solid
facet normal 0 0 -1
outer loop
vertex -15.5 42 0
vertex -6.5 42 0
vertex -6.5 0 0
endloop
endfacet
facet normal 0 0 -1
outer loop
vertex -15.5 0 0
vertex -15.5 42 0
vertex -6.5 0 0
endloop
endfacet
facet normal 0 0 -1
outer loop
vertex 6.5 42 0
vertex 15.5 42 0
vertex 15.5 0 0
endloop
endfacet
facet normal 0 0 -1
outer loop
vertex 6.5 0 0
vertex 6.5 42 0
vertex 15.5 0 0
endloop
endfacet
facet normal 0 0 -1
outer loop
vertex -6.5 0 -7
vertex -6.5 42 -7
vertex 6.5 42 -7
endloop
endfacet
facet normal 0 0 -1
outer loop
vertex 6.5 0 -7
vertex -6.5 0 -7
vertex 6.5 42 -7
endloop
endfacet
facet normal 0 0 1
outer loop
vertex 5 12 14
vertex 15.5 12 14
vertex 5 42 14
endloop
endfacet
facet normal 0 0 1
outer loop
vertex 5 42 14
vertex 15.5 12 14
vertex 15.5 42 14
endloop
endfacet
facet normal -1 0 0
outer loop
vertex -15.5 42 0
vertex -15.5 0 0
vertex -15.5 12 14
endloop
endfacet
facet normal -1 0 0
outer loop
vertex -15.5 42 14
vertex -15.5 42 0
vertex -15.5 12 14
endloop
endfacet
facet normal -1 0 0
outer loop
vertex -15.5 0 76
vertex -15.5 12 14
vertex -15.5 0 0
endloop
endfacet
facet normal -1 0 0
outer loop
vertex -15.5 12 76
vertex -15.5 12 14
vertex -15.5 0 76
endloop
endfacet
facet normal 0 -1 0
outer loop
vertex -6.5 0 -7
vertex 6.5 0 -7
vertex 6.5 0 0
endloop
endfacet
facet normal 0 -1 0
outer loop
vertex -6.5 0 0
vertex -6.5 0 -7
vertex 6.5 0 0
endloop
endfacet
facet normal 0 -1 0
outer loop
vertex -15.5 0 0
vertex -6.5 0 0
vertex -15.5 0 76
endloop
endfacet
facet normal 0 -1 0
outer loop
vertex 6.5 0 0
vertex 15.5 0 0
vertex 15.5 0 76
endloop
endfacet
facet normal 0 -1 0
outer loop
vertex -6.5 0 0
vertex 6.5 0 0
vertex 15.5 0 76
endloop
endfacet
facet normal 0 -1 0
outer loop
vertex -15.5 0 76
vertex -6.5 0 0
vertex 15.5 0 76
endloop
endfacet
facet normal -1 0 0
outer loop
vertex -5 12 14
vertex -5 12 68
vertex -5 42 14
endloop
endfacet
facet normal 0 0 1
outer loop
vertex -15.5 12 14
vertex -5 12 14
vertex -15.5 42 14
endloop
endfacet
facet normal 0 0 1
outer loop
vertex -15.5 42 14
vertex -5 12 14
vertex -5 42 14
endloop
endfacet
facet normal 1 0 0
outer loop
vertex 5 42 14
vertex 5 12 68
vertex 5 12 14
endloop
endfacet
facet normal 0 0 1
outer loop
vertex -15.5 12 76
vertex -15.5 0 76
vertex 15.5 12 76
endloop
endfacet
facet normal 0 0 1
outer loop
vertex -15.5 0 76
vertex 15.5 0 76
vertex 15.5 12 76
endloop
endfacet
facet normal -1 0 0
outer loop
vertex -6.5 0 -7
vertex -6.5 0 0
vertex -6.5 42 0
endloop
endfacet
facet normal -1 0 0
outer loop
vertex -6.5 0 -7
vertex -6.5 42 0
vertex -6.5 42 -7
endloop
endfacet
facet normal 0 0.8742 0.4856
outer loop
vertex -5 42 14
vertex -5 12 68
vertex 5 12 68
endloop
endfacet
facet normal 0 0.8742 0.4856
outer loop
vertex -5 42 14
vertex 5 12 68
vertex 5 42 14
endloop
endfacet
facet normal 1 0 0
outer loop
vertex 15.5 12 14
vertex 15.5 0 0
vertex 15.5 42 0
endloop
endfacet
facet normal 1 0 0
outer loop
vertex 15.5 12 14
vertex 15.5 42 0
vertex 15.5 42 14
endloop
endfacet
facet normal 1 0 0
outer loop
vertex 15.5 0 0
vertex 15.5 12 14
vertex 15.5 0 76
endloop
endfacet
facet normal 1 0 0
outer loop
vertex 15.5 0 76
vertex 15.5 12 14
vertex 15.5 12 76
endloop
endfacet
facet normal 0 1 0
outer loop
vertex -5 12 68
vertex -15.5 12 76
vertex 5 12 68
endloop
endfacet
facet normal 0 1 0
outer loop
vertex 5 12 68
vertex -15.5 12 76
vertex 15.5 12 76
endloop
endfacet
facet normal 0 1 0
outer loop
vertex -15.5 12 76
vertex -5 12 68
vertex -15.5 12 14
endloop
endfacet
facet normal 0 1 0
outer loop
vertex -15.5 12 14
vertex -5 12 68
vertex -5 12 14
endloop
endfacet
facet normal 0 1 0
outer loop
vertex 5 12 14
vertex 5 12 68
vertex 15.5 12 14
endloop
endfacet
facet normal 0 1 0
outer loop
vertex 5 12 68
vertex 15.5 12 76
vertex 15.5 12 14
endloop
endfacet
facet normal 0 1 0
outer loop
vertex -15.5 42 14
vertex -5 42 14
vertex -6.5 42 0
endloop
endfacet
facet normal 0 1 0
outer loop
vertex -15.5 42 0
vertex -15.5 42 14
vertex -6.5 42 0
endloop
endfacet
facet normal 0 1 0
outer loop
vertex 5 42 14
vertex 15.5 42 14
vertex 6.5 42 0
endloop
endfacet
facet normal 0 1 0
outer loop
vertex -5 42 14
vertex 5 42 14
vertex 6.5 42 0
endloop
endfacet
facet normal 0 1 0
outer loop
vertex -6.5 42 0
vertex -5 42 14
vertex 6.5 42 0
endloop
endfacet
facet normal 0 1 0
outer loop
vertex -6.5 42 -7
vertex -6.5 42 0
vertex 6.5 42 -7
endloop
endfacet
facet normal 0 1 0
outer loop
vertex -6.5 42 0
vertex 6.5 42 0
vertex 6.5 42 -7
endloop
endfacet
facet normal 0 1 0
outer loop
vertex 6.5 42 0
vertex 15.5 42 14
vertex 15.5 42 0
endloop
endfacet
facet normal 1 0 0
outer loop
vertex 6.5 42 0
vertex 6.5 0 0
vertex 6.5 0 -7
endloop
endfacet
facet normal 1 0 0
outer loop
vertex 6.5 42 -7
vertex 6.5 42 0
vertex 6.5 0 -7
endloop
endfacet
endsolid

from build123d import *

# Parameters (mm, degrees)
SALIENTE_EXTRUIR1_DEPTH = 15.5
CROQUIS2_W              = 13
CROQUIS2_H              = 7
SALIENTE_EXTRUIR2_DEPTH = 42
NERVIO1_REACH           = 90.206
CROQUIS3_WALL_W         = 240.185231722
CROQUIS3_WALL_H         = 10


with BuildPart() as part:
    # Croquis1 → Saliente-Extruir1 (new, symmetric)
    with BuildSketch(Plane(origin=(0, 0, 0), x_dir=(0, 0, -1), z_dir=(1, 0, 0))):
        Polygon((0, 0), (-76, 0), (-76, 12), (-14, 12), (-14, 42), (0, 42), align=None)
    extrude(amount=SALIENTE_EXTRUIR1_DEPTH, both=True)

    # Croquis2 → Saliente-Extruir2 (add)
    with BuildSketch(Plane(origin=(0, 42, 0), x_dir=(1, 0, 0), z_dir=(0, 1, 0))):
        with Locations((0, 3.5)):
            Rectangle(CROQUIS2_W, CROQUIS2_H)
    extrude(amount=-SALIENTE_EXTRUIR2_DEPTH)

    # Croquis3 wall → Nervio1 (add, up to next)
    with BuildSketch(Plane(origin=(0, 27, 41), x_dir=(0, 0.485642931179, -0.874157276122), z_dir=(0, 0.874157276122, 0.485642931179)), mode=Mode.PRIVATE) as nervio1_sk1:
        Rectangle(CROQUIS3_WALL_W, CROQUIS3_WALL_H)
    nervio1_tool1 = extrude(nervio1_sk1.sketch, amount=-NERVIO1_REACH, mode=Mode.PRIVATE) - part.part
    add(nervio1_tool1.solids().sort_by_distance((0, 27, 41))[0])


solid = part.part
